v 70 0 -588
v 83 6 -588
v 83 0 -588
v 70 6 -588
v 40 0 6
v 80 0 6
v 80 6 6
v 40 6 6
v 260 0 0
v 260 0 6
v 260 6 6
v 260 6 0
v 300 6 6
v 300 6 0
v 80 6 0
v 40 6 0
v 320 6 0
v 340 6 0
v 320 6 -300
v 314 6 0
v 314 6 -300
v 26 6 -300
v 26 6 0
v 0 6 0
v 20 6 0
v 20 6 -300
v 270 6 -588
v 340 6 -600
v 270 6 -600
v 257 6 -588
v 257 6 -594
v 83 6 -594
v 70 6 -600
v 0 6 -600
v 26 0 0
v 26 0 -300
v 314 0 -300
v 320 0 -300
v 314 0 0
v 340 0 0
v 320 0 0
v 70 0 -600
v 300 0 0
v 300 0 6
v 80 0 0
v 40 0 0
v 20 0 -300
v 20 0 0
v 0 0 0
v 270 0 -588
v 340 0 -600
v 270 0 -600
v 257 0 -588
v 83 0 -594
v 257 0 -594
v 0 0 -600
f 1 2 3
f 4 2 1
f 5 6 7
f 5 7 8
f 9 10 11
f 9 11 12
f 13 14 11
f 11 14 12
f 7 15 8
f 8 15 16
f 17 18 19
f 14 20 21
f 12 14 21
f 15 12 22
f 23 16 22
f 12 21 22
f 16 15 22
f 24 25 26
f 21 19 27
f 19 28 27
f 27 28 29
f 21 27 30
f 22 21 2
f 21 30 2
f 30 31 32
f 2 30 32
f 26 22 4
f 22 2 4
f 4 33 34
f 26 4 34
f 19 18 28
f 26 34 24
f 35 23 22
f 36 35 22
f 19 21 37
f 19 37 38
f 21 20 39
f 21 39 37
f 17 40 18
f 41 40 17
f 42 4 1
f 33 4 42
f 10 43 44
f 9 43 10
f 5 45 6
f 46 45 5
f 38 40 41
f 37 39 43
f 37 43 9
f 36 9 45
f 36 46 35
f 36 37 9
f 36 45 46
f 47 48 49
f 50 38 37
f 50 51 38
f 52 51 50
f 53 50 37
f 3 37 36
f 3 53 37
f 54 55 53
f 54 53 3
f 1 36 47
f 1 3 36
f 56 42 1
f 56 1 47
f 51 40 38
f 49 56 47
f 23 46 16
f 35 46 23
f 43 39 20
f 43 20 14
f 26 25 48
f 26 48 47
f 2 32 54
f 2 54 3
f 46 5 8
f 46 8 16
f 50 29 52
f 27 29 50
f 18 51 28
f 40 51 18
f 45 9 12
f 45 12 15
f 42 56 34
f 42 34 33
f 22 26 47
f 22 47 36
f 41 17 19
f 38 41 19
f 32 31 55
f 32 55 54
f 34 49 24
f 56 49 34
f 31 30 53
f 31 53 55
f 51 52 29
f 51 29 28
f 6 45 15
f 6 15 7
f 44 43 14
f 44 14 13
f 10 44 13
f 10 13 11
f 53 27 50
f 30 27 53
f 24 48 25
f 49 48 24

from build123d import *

# Parameters (mm, degrees)
BOSS_EXTRUDE1_DEPTH = 6
SKETCH2_W           = 6
SKETCH2_H           = 300
CUT_EXTRUDE1_DEPTH  = 6
LPATTERN1_COUNT     = 2
LPATTERN1_PITCH     = 294
CUT_EXTRUDE2_DEPTH  = 6


with BuildPart() as part:
    # Sketch1 → Boss-Extrude1 (new body)
    with BuildSketch(Plane(origin=(0, 0, 0), x_dir=(1, 0, 0), z_dir=(0, 1, 0))):
        Polygon((300, 0), (300, -6), (260, -6), (260, 0), (80, 0), (80, -6), (40, -6), (40, 0), (0, 0), (0, 600), (340, 600), (340, 0), align=None)
    extrude(amount=BOSS_EXTRUDE1_DEPTH)

    # Sketch2 → Cut-Extrude1 (cut)
    with BuildSketch(Plane(origin=(0, 6, 0), x_dir=(1, 0, 0), z_dir=(0, 1, 0))):
        with Locations((23, 150)):
            Rectangle(SKETCH2_W, SKETCH2_H)
    cut_extrude1 = extrude(amount=-CUT_EXTRUDE1_DEPTH, mode=Mode.SUBTRACT)

    # LPattern1: Cut-Extrude1 ×2
    with Locations(*[(i * LPATTERN1_PITCH, 0, 0) for i in range(1, LPATTERN1_COUNT)]):
        add(cut_extrude1, mode=Mode.SUBTRACT)

    # Sketch3 → Cut-Extrude2 (cut)
    with BuildSketch(Plane(origin=(0, 6, 0), x_dir=(1, 0, 0), z_dir=(0, 1, 0))):
        Polygon((70, 600), (270, 600), (270, 588), (257, 588), (257, 594), (83, 594), (83, 588), (70, 588), align=None)
    extrude(amount=-CUT_EXTRUDE2_DEPTH, mode=Mode.SUBTRACT)


solid = part.part
